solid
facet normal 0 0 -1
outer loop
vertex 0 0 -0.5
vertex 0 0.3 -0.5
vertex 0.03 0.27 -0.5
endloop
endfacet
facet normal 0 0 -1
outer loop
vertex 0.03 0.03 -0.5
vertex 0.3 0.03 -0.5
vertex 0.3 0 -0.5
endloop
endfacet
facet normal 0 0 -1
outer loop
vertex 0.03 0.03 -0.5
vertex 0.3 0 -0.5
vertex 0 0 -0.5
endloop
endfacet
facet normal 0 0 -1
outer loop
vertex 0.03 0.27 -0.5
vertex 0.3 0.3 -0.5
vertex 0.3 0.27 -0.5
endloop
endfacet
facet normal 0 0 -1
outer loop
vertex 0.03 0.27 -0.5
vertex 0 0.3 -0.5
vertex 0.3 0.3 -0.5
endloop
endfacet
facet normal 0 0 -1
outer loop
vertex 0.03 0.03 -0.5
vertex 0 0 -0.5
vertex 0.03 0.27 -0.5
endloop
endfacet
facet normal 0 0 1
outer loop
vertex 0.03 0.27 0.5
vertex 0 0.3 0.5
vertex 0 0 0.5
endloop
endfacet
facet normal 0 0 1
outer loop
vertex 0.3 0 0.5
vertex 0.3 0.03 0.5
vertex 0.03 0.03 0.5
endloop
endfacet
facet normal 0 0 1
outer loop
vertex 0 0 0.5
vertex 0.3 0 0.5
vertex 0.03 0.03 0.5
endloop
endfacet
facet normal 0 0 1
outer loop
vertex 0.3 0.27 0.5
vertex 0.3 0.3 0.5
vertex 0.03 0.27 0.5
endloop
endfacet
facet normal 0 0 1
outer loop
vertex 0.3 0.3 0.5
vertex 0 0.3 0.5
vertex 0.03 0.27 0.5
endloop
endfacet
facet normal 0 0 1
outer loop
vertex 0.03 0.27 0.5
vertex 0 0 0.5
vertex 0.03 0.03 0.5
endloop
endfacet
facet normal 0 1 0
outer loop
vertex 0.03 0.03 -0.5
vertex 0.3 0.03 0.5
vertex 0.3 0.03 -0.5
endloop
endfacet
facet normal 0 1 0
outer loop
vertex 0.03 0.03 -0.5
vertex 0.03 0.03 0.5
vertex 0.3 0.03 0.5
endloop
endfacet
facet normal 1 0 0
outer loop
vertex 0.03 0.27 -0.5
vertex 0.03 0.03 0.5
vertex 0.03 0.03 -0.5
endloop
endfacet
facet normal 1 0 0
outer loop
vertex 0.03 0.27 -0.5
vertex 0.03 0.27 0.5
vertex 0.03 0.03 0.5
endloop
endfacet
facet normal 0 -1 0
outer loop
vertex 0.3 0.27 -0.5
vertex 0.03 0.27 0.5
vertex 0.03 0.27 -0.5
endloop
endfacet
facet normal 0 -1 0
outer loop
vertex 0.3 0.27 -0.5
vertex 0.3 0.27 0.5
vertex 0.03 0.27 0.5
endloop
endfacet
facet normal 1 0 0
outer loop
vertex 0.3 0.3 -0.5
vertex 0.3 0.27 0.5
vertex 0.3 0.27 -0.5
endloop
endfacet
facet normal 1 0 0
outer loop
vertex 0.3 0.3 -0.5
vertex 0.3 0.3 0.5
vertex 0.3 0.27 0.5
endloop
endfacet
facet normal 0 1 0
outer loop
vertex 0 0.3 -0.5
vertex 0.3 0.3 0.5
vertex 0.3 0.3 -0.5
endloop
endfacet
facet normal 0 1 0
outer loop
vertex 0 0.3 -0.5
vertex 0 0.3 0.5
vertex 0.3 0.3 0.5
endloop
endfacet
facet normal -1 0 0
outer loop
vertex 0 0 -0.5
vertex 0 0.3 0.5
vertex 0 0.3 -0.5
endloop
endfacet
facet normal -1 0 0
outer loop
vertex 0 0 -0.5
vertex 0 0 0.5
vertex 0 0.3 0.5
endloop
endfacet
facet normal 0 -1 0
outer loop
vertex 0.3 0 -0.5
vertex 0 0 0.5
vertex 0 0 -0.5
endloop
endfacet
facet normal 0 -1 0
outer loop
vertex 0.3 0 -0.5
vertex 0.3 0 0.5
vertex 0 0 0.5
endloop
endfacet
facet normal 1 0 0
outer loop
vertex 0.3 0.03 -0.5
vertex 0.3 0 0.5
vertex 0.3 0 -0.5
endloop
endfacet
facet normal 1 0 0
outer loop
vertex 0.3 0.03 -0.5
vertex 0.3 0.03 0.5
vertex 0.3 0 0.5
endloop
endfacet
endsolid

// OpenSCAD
module Beam_C(){
    scale([0.1,0.1,0.1])
    color("#CCCCCC"){
        linear_extrude(height = 10, center = true){
        polygon(points =[[0,0],[3,0],[3,0.3],[0.3,0.3],[0.3,2.7],[3,2.7],[3,3],[0,3]]);
            }
    }
}

Beam_C();


// Written by Nicolì Angelo (Gengio) 2024: 
// MIT License


//Permission is hereby granted, free of charge, to any person obtaining a copy of this software and associated documentation files (the "Software"), to deal in the Software without restriction, including without limitation the rights to use, copy, modify, merge, publish, distribute, sublicense, and/or sell copies of the Software, and to permit persons to whom the Software is furnished to do so, subject to the following conditions:

//The above copyright notice and this permission notice shall be included in all copies or substantial portions of the Software.

//THE SOFTWARE IS PROVIDED "AS IS", WITHOUT WARRANTY OF ANY KIND, EXPRESS OR IMPLIED, INCLUDING BUT NOT LIMITED TO THE WARRANTIES OF MERCHANTABILITY, FITNESS FOR A PARTICULAR PURPOSE AND NONINFRINGEMENT. IN NO EVENT SHALL THE AUTHORS OR COPYRIGHT HOLDERS BE LIABLE FOR ANY CLAIM, DAMAGES OR OTHER LIABILITY, WHETHER IN AN ACTION OF CONTRACT, TORT OR OTHERWISE, ARISING FROM, OUT OF OR IN CONNECTION WITH THE SOFTWARE OR THE USE OR OTHER DEALINGS IN THE SOFTWARE.
